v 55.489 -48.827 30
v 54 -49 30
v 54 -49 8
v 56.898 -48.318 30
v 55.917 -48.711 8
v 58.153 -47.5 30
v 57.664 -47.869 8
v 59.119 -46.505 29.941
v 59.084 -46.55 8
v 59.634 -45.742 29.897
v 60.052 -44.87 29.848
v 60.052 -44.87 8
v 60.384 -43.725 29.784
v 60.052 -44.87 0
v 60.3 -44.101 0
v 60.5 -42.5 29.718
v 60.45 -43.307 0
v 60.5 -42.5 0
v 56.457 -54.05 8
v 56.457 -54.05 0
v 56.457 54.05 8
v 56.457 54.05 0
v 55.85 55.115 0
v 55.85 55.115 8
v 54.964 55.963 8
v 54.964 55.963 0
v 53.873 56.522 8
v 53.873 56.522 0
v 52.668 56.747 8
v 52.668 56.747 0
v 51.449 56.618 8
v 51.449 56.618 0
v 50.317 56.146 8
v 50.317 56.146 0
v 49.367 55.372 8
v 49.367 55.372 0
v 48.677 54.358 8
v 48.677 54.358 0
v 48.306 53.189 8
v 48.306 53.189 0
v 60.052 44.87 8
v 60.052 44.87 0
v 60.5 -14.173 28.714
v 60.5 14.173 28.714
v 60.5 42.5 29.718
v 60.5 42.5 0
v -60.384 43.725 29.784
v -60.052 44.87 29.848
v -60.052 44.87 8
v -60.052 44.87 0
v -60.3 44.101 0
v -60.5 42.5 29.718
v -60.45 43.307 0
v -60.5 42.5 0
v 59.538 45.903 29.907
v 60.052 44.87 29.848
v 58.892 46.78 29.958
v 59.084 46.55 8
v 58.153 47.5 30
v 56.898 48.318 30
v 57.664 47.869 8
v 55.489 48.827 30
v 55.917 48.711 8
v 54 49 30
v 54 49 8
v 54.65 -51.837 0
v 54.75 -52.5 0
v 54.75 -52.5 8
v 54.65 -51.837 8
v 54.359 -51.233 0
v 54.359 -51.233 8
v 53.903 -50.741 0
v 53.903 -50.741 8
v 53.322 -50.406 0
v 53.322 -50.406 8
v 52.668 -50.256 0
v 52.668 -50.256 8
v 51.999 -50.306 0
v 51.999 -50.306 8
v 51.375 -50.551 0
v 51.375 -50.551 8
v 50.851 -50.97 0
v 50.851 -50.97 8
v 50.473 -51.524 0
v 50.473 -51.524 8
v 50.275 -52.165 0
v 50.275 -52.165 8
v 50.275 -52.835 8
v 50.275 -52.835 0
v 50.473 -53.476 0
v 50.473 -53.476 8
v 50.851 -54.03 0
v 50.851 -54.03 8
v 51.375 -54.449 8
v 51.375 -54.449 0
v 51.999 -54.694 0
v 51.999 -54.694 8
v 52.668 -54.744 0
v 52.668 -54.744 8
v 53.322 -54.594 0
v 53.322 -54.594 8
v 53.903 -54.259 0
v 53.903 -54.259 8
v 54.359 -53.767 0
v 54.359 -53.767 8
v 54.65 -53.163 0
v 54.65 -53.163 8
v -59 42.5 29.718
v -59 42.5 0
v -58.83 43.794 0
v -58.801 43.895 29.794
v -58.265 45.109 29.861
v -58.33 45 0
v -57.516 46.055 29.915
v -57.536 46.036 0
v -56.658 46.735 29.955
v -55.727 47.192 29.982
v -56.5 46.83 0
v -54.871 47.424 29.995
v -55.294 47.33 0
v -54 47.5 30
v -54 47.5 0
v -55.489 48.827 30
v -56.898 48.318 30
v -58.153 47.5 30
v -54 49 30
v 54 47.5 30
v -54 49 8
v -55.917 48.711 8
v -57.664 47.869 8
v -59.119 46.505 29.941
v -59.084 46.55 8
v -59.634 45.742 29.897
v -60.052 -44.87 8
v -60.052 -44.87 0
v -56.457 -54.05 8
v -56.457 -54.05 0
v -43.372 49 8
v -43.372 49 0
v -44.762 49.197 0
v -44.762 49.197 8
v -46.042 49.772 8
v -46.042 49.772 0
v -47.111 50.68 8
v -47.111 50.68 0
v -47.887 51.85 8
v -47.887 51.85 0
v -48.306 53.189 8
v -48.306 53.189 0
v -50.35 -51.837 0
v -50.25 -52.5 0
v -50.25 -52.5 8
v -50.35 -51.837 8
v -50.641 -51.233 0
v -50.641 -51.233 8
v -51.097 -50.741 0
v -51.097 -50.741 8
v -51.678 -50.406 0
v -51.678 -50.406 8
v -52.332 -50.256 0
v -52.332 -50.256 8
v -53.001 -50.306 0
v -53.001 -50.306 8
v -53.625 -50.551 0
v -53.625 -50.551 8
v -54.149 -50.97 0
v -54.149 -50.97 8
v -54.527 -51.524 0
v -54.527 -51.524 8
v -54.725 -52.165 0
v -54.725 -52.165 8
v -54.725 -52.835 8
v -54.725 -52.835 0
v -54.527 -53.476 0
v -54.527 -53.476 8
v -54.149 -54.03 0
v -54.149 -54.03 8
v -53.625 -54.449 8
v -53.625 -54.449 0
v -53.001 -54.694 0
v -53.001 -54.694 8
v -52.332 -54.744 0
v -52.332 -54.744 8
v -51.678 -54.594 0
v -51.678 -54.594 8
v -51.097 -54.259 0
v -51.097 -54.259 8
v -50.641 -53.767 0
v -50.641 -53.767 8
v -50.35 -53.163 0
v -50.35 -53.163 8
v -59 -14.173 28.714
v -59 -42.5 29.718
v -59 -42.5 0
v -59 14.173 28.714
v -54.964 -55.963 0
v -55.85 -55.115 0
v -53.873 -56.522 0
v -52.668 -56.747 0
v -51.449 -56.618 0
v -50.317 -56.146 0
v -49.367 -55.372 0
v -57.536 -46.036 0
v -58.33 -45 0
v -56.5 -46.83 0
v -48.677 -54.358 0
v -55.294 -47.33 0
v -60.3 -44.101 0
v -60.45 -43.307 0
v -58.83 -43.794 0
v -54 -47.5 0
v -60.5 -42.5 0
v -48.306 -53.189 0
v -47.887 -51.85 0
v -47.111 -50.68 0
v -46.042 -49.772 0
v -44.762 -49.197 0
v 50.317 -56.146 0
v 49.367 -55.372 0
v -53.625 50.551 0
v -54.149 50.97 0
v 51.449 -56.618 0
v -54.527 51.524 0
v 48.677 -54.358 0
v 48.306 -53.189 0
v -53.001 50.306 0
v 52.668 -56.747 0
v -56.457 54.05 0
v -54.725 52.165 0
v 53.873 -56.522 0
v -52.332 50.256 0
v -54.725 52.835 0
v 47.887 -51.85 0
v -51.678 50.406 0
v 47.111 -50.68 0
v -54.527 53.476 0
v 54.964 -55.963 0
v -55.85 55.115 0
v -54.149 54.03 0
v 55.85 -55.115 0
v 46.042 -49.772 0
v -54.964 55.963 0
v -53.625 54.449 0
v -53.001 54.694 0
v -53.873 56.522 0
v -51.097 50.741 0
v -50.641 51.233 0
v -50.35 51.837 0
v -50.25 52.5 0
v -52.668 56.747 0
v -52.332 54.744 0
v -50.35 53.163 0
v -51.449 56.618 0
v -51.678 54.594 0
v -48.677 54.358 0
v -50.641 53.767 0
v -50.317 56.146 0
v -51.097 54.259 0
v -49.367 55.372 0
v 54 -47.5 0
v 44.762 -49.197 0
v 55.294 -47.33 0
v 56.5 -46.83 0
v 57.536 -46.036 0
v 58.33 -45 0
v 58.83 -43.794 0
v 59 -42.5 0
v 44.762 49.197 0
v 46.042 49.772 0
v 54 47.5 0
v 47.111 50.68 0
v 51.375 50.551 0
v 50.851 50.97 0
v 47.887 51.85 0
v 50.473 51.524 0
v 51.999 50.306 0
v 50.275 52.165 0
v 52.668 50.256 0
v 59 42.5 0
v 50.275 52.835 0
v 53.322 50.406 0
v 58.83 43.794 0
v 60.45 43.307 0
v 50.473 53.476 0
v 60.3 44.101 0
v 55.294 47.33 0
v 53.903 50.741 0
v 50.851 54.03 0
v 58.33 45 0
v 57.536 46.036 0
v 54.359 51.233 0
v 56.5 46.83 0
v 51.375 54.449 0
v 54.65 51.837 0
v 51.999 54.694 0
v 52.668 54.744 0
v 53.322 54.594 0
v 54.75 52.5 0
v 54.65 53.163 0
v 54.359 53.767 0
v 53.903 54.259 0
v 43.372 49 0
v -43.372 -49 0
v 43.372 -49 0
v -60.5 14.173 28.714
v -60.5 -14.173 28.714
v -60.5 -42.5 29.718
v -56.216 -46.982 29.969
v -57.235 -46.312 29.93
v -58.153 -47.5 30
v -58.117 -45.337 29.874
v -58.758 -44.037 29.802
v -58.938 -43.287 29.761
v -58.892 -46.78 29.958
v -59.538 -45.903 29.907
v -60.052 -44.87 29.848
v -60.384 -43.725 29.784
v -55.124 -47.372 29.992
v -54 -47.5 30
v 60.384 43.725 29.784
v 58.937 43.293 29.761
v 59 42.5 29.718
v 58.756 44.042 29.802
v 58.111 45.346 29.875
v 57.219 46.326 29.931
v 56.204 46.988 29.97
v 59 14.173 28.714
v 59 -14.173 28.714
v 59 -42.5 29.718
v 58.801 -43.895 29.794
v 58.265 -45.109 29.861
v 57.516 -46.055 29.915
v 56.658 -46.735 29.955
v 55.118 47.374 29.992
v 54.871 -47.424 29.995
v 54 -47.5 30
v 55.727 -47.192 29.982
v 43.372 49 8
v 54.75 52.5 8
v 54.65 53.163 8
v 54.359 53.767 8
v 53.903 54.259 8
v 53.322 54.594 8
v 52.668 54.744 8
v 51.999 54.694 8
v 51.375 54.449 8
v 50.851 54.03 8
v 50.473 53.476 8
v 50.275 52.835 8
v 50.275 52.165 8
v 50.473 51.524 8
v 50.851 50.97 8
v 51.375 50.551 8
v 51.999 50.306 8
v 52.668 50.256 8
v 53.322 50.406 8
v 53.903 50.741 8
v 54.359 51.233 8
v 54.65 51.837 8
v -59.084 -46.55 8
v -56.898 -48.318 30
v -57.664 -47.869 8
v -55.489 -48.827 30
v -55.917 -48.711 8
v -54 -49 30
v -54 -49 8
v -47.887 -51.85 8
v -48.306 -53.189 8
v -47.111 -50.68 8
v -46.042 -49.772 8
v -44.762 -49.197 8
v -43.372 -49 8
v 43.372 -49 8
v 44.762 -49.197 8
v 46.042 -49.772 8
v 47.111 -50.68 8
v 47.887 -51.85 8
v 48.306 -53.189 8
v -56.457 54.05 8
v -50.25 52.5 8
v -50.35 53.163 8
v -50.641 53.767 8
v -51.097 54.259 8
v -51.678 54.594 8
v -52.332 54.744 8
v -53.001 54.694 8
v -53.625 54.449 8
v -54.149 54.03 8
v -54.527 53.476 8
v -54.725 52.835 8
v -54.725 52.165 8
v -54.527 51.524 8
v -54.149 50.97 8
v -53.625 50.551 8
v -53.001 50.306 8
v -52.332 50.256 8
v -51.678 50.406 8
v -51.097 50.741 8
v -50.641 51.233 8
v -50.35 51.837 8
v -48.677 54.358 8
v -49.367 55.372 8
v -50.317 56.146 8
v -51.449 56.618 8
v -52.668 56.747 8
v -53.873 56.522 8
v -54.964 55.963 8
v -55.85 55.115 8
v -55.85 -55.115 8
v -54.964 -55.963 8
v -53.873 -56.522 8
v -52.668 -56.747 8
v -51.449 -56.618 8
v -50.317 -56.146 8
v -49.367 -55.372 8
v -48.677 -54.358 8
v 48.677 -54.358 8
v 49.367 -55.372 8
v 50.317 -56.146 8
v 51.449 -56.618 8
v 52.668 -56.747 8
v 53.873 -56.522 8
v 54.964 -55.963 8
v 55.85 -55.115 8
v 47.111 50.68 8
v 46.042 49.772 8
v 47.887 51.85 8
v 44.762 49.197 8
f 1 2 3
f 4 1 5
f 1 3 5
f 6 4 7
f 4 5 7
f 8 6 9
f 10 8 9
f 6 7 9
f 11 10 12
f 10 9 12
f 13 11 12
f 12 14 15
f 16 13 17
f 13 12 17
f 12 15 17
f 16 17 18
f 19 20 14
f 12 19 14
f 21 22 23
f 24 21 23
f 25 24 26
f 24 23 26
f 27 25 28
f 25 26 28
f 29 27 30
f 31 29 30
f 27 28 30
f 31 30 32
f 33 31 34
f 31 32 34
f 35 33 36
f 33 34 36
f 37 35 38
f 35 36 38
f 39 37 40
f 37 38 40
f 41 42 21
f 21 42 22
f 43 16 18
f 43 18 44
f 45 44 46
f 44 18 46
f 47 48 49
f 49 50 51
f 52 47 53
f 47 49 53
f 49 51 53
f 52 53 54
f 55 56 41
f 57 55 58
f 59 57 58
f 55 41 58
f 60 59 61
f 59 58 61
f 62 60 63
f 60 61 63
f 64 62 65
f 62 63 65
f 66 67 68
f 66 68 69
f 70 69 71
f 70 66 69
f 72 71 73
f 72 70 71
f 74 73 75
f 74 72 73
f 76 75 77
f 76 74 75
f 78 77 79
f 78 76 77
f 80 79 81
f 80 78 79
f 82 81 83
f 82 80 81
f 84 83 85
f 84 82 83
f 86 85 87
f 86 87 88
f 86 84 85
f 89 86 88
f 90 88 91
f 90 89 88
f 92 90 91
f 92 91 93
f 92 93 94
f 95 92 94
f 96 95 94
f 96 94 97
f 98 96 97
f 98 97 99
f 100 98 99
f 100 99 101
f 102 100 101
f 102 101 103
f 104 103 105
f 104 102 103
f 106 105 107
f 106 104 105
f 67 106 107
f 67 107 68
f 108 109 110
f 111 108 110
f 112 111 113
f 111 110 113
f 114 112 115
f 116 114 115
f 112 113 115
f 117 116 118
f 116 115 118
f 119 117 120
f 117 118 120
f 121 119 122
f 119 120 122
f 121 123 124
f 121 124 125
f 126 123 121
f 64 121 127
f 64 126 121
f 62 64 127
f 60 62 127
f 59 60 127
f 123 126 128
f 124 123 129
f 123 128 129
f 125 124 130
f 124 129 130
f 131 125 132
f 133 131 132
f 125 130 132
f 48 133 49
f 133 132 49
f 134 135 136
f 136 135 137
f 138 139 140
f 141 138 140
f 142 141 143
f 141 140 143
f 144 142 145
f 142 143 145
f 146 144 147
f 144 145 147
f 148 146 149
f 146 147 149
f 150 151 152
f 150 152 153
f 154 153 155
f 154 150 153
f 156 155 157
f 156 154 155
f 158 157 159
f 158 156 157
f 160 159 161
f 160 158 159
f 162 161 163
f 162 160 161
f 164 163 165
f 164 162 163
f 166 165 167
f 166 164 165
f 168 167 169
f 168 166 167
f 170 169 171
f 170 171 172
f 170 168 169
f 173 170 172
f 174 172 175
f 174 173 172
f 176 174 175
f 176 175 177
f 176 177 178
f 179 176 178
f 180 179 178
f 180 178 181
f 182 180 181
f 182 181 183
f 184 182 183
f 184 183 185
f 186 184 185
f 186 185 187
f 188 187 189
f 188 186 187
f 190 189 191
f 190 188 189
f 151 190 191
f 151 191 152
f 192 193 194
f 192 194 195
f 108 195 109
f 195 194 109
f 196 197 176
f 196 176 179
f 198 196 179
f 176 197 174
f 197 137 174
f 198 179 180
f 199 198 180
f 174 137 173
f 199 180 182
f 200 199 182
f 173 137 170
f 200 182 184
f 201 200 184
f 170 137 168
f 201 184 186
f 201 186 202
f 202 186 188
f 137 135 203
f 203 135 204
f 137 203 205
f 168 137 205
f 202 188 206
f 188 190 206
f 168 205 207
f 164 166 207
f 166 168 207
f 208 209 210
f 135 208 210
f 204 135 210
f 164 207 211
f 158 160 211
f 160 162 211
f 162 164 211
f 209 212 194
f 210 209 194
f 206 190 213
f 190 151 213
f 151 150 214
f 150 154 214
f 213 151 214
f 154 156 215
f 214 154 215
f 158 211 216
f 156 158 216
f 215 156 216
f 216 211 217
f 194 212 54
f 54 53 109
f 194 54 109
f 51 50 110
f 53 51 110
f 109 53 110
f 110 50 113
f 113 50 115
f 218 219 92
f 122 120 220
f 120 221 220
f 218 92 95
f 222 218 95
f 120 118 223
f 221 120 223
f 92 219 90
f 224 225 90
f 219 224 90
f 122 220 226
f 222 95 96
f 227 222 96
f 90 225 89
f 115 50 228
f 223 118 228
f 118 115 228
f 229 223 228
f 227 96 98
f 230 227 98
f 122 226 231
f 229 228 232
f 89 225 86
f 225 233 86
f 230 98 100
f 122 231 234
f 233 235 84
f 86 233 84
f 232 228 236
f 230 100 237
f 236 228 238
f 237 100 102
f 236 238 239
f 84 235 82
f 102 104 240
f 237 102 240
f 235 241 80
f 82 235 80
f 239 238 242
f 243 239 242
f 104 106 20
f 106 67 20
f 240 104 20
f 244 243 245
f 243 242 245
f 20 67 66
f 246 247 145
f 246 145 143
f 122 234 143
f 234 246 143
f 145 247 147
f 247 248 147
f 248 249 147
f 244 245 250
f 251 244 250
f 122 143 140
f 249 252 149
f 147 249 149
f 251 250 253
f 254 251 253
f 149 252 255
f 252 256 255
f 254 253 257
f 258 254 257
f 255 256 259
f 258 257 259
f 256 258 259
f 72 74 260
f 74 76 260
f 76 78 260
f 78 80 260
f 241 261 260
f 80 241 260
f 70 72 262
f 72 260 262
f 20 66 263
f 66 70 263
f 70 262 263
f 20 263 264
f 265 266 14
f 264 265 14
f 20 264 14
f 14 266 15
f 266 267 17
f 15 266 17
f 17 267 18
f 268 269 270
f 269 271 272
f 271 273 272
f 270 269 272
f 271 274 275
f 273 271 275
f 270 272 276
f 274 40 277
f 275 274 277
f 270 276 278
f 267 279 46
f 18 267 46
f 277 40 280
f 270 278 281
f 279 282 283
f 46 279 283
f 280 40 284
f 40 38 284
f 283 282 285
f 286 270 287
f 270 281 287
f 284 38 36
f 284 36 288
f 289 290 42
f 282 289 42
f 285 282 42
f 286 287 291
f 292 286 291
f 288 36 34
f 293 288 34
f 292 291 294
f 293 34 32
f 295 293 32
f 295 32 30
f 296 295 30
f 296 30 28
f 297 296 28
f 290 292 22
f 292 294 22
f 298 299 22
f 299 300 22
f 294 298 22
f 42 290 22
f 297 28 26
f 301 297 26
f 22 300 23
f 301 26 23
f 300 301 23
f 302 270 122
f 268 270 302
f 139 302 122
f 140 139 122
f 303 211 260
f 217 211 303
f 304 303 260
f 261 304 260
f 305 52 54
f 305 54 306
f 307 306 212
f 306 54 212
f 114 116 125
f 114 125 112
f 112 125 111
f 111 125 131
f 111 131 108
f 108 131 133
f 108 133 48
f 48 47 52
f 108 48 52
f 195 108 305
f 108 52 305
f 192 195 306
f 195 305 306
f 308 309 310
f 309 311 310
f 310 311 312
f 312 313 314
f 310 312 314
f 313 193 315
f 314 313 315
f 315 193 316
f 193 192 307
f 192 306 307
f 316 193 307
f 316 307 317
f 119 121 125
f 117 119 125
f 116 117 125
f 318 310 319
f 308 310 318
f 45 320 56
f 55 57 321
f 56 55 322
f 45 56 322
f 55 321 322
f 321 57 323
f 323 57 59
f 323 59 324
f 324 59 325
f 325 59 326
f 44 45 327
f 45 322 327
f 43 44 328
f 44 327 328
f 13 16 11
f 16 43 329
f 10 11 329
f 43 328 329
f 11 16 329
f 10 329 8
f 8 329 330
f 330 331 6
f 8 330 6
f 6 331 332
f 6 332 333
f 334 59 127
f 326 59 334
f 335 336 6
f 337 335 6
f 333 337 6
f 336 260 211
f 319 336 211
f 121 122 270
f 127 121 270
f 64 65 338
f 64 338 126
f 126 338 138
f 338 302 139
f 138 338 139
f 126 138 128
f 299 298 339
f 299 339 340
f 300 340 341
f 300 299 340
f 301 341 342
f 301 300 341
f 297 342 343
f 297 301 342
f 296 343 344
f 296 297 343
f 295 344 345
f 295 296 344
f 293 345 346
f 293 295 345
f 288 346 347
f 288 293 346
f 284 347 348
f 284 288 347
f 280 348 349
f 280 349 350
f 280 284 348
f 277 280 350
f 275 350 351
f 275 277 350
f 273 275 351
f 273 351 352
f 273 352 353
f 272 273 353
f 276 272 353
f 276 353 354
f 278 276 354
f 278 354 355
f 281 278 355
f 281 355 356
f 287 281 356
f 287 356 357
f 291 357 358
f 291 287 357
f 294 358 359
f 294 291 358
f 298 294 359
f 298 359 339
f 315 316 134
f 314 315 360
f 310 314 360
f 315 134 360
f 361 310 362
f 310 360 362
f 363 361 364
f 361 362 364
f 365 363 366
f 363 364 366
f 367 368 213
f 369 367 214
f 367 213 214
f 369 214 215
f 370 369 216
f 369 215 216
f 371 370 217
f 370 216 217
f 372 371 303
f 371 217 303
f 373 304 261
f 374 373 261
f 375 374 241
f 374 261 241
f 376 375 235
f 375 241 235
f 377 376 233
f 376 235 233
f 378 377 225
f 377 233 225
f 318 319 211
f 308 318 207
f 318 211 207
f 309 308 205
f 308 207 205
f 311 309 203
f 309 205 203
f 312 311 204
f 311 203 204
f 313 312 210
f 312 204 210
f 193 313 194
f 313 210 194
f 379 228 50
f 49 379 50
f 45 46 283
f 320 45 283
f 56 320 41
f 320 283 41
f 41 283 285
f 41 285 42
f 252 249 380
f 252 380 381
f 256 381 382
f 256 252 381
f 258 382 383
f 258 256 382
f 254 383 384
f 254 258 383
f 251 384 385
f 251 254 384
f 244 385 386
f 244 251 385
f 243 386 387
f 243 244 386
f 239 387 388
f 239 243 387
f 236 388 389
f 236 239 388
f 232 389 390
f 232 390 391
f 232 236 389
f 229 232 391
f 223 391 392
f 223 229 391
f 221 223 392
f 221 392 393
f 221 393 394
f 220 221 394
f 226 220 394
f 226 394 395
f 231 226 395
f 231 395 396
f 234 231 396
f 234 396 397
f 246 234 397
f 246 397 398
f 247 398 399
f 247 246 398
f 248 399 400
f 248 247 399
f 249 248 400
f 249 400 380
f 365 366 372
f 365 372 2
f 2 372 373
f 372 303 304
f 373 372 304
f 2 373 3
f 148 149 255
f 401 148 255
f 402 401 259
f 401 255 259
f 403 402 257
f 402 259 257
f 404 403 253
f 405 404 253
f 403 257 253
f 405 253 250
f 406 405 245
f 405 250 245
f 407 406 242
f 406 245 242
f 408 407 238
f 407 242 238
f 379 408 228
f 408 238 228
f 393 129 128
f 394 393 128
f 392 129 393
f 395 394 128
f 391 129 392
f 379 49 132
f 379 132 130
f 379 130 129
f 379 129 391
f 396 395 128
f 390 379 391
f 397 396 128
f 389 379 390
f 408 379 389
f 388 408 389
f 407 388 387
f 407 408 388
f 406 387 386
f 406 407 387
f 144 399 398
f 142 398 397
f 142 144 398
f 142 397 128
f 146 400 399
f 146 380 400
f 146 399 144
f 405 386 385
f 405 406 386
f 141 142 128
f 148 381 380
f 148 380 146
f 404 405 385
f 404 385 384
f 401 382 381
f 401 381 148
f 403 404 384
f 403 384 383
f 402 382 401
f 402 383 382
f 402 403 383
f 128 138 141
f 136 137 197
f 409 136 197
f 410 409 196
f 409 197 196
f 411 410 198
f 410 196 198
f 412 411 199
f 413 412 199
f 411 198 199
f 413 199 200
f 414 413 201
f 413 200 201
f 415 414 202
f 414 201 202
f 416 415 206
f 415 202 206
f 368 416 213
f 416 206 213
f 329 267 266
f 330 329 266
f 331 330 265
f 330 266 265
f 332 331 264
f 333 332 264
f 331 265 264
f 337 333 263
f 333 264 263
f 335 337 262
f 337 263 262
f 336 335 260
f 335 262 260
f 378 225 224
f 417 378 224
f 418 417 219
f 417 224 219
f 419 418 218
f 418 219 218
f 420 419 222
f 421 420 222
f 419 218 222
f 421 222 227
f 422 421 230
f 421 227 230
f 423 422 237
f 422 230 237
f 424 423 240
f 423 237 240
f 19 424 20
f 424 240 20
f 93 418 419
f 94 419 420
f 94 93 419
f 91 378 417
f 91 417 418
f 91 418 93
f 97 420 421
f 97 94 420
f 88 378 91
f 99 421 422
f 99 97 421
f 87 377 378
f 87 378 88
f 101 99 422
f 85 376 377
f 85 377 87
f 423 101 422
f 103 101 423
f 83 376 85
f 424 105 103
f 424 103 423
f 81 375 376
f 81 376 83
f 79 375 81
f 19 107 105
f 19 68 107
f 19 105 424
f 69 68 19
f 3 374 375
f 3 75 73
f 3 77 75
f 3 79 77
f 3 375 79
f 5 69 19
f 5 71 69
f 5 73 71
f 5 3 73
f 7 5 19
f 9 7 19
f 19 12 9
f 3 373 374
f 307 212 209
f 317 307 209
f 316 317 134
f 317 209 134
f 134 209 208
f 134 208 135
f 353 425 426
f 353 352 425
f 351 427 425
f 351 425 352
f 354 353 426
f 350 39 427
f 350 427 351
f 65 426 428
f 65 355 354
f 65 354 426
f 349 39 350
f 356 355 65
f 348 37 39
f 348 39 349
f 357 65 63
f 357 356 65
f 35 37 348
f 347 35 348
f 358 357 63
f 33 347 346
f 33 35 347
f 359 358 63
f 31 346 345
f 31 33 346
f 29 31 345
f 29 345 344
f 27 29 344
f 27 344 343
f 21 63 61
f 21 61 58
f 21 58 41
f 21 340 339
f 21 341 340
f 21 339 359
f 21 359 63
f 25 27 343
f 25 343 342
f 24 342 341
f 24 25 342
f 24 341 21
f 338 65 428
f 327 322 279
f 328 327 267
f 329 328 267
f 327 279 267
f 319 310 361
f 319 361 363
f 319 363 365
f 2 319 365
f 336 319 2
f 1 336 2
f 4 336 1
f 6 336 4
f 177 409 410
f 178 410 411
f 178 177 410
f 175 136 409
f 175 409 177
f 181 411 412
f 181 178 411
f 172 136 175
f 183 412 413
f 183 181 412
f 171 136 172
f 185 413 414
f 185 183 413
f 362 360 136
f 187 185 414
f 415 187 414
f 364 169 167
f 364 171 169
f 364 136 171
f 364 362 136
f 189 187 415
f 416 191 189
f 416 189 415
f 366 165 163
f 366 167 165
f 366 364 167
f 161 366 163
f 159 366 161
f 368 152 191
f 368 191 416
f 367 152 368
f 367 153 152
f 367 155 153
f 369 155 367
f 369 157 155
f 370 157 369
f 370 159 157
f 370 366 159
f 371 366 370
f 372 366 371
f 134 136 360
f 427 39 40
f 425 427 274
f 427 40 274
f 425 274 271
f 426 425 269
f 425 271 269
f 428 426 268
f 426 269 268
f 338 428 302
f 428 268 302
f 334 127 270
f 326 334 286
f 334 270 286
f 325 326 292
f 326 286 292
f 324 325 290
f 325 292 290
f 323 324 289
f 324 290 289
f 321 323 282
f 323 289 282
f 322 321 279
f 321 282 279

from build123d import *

# Parameters (mm, degrees)
F1_DEPTH = 30
F0_R     = 2.25
F2_DEPTH = 8
F3_R     = 800
F4_DEPTH = 121.001


with BuildPart() as f1:
    # F0 (on Top) → F1 (new body)
    with BuildSketch(Plane.XY):
        with BuildLine():
            ThreePointArc((60.0523881171, -44.8703582176), (60.3871168285, -43.7061254575), (60.5, -42.5))
            Line((60.5, -42.5), (60.5, 42.5))
            ThreePointArc((60.5, 42.5), (60.3871168285, 43.7061254575), (60.0523881171, 44.8703582176))
            ThreePointArc((60.0523881171, 44.8703582176), (57.6635141317, 47.8692331116), (54, 49))
            Line((54, 49), (43.3724318682, 49))
            Line((43.3724318682, 49), (-43.3724318682, 49))
            Line((-43.3724318682, 49), (-54, 49))
            ThreePointArc((-54, 49), (-57.6635141317, 47.8692331116), (-60.0523881171, 44.8703582176))
            ThreePointArc((-60.0523881171, 44.8703582176), (-60.3871168285, 43.7061254575), (-60.5, 42.5))
            Line((-60.5, 42.5), (-60.5, -42.5))
            ThreePointArc((-60.5, -42.5), (-60.3871168285, -43.7061254575), (-60.0523881171, -44.8703582176))
            ThreePointArc((-60.0523881171, -44.8703582176), (-57.6635141317, -47.8692331116), (-54, -49))
            Line((-54, -49), (-43.3724318682, -49))
            Line((-43.3724318682, -49), (43.3724318682, -49))
            Line((43.3724318682, -49), (54, -49))
            ThreePointArc((54, -49), (57.6635141317, -47.8692331116), (60.0523881171, -44.8703582176))
        make_face()
        with BuildLine():
            Line((-54, 47.5), (54, 47.5))
            ThreePointArc((54, 47.5), (57.5355339059, 46.0355339059), (59, 42.5))
            Line((59, 42.5), (59, -42.5))
            ThreePointArc((59, -42.5), (57.5355339059, -46.0355339059), (54, -47.5))
            Line((54, -47.5), (-54, -47.5))
            ThreePointArc((-54, -47.5), (-57.5355339059, -46.0355339059), (-59, -42.5))
            Line((-59, -42.5), (-59, 42.5))
            ThreePointArc((-59, 42.5), (-57.5355339059, 46.0355339059), (-54, 47.5))
        make_face(mode=Mode.SUBTRACT)
    extrude(amount=F1_DEPTH)

    # F0 (on Top) → F2 (join)
    with BuildSketch(Plane.XY):
        with BuildLine():
            Line((-54, 49), (-43.3724318682, 49))
            ThreePointArc((-43.3724318682, 49), (-46.6086291695, 50.1885662767), (-48.30625248, 53.1891891892))
            ThreePointArc((-48.30625248, 53.1891891892), (-52.0537295479, 56.7265047833), (-56.457330692, 54.0498496038))
            Line((-56.457330692, 54.0498496038), (-60.0523881171, 44.8703582176))
            ThreePointArc((-60.0523881171, 44.8703582176), (-57.6635141317, 47.8692331116), (-54, 49))
        make_face()
        with Locations((-52.5, 52.5)):
            Circle(F0_R, mode=Mode.SUBTRACT)
        with BuildLine():
            ThreePointArc((-48.30625248, -53.1891891892), (-46.6086291695, -50.1885662767), (-43.3724318682, -49))
            Line((-43.3724318682, -49), (-54, -49))
            ThreePointArc((-54, -49), (-57.6635141317, -47.8692331116), (-60.0523881171, -44.8703582176))
            Line((-60.0523881171, -44.8703582176), (-56.457330692, -54.0498496038))
            ThreePointArc((-56.457330692, -54.0498496038), (-52.0537295479, -56.7265047833), (-48.30625248, -53.1891891892))
        make_face()
        with Locations((-52.5, -52.5)):
            Circle(F0_R, mode=Mode.SUBTRACT)
        with BuildLine():
            Line((56.457330692, -54.0498496038), (60.0523881171, -44.8703582176))
            ThreePointArc((60.0523881171, -44.8703582176), (57.6635141317, -47.8692331116), (54, -49))
            Line((54, -49), (43.3724318682, -49))
            ThreePointArc((43.3724318682, -49), (46.6086291695, -50.1885662767), (48.30625248, -53.1891891892))
            ThreePointArc((48.30625248, -53.1891891892), (52.0537295479, -56.7265047833), (56.457330692, -54.0498496038))
        make_face()
        with Locations((52.5, -52.5)):
            Circle(F0_R, mode=Mode.SUBTRACT)
        with BuildLine():
            ThreePointArc((54, 49), (57.6635141317, 47.8692331116), (60.0523881171, 44.8703582176))
            Line((60.0523881171, 44.8703582176), (56.457330692, 54.0498496038))
            ThreePointArc((56.457330692, 54.0498496038), (52.0537295479, 56.7265047833), (48.30625248, 53.1891891892))
            ThreePointArc((48.30625248, 53.1891891892), (46.6086291695, 50.1885662767), (43.3724318682, 49))
            Line((43.3724318682, 49), (54, 49))
        make_face()
        with Locations((52.5, 52.5)):
            Circle(F0_R, mode=Mode.SUBTRACT)
    extrude(amount=F2_DEPTH)

    # F3 (on face) → F4 (cut, through all)
    with BuildSketch(Plane(origin=(-60.5, 0, 0), x_dir=(0, -1, 0), z_dir=(-1, 0, 0))):
        with Locations((0, 828.5885987165)):
            Circle(F3_R)
    extrude(amount=-F4_DEPTH, mode=Mode.SUBTRACT)


solid = f1.part
